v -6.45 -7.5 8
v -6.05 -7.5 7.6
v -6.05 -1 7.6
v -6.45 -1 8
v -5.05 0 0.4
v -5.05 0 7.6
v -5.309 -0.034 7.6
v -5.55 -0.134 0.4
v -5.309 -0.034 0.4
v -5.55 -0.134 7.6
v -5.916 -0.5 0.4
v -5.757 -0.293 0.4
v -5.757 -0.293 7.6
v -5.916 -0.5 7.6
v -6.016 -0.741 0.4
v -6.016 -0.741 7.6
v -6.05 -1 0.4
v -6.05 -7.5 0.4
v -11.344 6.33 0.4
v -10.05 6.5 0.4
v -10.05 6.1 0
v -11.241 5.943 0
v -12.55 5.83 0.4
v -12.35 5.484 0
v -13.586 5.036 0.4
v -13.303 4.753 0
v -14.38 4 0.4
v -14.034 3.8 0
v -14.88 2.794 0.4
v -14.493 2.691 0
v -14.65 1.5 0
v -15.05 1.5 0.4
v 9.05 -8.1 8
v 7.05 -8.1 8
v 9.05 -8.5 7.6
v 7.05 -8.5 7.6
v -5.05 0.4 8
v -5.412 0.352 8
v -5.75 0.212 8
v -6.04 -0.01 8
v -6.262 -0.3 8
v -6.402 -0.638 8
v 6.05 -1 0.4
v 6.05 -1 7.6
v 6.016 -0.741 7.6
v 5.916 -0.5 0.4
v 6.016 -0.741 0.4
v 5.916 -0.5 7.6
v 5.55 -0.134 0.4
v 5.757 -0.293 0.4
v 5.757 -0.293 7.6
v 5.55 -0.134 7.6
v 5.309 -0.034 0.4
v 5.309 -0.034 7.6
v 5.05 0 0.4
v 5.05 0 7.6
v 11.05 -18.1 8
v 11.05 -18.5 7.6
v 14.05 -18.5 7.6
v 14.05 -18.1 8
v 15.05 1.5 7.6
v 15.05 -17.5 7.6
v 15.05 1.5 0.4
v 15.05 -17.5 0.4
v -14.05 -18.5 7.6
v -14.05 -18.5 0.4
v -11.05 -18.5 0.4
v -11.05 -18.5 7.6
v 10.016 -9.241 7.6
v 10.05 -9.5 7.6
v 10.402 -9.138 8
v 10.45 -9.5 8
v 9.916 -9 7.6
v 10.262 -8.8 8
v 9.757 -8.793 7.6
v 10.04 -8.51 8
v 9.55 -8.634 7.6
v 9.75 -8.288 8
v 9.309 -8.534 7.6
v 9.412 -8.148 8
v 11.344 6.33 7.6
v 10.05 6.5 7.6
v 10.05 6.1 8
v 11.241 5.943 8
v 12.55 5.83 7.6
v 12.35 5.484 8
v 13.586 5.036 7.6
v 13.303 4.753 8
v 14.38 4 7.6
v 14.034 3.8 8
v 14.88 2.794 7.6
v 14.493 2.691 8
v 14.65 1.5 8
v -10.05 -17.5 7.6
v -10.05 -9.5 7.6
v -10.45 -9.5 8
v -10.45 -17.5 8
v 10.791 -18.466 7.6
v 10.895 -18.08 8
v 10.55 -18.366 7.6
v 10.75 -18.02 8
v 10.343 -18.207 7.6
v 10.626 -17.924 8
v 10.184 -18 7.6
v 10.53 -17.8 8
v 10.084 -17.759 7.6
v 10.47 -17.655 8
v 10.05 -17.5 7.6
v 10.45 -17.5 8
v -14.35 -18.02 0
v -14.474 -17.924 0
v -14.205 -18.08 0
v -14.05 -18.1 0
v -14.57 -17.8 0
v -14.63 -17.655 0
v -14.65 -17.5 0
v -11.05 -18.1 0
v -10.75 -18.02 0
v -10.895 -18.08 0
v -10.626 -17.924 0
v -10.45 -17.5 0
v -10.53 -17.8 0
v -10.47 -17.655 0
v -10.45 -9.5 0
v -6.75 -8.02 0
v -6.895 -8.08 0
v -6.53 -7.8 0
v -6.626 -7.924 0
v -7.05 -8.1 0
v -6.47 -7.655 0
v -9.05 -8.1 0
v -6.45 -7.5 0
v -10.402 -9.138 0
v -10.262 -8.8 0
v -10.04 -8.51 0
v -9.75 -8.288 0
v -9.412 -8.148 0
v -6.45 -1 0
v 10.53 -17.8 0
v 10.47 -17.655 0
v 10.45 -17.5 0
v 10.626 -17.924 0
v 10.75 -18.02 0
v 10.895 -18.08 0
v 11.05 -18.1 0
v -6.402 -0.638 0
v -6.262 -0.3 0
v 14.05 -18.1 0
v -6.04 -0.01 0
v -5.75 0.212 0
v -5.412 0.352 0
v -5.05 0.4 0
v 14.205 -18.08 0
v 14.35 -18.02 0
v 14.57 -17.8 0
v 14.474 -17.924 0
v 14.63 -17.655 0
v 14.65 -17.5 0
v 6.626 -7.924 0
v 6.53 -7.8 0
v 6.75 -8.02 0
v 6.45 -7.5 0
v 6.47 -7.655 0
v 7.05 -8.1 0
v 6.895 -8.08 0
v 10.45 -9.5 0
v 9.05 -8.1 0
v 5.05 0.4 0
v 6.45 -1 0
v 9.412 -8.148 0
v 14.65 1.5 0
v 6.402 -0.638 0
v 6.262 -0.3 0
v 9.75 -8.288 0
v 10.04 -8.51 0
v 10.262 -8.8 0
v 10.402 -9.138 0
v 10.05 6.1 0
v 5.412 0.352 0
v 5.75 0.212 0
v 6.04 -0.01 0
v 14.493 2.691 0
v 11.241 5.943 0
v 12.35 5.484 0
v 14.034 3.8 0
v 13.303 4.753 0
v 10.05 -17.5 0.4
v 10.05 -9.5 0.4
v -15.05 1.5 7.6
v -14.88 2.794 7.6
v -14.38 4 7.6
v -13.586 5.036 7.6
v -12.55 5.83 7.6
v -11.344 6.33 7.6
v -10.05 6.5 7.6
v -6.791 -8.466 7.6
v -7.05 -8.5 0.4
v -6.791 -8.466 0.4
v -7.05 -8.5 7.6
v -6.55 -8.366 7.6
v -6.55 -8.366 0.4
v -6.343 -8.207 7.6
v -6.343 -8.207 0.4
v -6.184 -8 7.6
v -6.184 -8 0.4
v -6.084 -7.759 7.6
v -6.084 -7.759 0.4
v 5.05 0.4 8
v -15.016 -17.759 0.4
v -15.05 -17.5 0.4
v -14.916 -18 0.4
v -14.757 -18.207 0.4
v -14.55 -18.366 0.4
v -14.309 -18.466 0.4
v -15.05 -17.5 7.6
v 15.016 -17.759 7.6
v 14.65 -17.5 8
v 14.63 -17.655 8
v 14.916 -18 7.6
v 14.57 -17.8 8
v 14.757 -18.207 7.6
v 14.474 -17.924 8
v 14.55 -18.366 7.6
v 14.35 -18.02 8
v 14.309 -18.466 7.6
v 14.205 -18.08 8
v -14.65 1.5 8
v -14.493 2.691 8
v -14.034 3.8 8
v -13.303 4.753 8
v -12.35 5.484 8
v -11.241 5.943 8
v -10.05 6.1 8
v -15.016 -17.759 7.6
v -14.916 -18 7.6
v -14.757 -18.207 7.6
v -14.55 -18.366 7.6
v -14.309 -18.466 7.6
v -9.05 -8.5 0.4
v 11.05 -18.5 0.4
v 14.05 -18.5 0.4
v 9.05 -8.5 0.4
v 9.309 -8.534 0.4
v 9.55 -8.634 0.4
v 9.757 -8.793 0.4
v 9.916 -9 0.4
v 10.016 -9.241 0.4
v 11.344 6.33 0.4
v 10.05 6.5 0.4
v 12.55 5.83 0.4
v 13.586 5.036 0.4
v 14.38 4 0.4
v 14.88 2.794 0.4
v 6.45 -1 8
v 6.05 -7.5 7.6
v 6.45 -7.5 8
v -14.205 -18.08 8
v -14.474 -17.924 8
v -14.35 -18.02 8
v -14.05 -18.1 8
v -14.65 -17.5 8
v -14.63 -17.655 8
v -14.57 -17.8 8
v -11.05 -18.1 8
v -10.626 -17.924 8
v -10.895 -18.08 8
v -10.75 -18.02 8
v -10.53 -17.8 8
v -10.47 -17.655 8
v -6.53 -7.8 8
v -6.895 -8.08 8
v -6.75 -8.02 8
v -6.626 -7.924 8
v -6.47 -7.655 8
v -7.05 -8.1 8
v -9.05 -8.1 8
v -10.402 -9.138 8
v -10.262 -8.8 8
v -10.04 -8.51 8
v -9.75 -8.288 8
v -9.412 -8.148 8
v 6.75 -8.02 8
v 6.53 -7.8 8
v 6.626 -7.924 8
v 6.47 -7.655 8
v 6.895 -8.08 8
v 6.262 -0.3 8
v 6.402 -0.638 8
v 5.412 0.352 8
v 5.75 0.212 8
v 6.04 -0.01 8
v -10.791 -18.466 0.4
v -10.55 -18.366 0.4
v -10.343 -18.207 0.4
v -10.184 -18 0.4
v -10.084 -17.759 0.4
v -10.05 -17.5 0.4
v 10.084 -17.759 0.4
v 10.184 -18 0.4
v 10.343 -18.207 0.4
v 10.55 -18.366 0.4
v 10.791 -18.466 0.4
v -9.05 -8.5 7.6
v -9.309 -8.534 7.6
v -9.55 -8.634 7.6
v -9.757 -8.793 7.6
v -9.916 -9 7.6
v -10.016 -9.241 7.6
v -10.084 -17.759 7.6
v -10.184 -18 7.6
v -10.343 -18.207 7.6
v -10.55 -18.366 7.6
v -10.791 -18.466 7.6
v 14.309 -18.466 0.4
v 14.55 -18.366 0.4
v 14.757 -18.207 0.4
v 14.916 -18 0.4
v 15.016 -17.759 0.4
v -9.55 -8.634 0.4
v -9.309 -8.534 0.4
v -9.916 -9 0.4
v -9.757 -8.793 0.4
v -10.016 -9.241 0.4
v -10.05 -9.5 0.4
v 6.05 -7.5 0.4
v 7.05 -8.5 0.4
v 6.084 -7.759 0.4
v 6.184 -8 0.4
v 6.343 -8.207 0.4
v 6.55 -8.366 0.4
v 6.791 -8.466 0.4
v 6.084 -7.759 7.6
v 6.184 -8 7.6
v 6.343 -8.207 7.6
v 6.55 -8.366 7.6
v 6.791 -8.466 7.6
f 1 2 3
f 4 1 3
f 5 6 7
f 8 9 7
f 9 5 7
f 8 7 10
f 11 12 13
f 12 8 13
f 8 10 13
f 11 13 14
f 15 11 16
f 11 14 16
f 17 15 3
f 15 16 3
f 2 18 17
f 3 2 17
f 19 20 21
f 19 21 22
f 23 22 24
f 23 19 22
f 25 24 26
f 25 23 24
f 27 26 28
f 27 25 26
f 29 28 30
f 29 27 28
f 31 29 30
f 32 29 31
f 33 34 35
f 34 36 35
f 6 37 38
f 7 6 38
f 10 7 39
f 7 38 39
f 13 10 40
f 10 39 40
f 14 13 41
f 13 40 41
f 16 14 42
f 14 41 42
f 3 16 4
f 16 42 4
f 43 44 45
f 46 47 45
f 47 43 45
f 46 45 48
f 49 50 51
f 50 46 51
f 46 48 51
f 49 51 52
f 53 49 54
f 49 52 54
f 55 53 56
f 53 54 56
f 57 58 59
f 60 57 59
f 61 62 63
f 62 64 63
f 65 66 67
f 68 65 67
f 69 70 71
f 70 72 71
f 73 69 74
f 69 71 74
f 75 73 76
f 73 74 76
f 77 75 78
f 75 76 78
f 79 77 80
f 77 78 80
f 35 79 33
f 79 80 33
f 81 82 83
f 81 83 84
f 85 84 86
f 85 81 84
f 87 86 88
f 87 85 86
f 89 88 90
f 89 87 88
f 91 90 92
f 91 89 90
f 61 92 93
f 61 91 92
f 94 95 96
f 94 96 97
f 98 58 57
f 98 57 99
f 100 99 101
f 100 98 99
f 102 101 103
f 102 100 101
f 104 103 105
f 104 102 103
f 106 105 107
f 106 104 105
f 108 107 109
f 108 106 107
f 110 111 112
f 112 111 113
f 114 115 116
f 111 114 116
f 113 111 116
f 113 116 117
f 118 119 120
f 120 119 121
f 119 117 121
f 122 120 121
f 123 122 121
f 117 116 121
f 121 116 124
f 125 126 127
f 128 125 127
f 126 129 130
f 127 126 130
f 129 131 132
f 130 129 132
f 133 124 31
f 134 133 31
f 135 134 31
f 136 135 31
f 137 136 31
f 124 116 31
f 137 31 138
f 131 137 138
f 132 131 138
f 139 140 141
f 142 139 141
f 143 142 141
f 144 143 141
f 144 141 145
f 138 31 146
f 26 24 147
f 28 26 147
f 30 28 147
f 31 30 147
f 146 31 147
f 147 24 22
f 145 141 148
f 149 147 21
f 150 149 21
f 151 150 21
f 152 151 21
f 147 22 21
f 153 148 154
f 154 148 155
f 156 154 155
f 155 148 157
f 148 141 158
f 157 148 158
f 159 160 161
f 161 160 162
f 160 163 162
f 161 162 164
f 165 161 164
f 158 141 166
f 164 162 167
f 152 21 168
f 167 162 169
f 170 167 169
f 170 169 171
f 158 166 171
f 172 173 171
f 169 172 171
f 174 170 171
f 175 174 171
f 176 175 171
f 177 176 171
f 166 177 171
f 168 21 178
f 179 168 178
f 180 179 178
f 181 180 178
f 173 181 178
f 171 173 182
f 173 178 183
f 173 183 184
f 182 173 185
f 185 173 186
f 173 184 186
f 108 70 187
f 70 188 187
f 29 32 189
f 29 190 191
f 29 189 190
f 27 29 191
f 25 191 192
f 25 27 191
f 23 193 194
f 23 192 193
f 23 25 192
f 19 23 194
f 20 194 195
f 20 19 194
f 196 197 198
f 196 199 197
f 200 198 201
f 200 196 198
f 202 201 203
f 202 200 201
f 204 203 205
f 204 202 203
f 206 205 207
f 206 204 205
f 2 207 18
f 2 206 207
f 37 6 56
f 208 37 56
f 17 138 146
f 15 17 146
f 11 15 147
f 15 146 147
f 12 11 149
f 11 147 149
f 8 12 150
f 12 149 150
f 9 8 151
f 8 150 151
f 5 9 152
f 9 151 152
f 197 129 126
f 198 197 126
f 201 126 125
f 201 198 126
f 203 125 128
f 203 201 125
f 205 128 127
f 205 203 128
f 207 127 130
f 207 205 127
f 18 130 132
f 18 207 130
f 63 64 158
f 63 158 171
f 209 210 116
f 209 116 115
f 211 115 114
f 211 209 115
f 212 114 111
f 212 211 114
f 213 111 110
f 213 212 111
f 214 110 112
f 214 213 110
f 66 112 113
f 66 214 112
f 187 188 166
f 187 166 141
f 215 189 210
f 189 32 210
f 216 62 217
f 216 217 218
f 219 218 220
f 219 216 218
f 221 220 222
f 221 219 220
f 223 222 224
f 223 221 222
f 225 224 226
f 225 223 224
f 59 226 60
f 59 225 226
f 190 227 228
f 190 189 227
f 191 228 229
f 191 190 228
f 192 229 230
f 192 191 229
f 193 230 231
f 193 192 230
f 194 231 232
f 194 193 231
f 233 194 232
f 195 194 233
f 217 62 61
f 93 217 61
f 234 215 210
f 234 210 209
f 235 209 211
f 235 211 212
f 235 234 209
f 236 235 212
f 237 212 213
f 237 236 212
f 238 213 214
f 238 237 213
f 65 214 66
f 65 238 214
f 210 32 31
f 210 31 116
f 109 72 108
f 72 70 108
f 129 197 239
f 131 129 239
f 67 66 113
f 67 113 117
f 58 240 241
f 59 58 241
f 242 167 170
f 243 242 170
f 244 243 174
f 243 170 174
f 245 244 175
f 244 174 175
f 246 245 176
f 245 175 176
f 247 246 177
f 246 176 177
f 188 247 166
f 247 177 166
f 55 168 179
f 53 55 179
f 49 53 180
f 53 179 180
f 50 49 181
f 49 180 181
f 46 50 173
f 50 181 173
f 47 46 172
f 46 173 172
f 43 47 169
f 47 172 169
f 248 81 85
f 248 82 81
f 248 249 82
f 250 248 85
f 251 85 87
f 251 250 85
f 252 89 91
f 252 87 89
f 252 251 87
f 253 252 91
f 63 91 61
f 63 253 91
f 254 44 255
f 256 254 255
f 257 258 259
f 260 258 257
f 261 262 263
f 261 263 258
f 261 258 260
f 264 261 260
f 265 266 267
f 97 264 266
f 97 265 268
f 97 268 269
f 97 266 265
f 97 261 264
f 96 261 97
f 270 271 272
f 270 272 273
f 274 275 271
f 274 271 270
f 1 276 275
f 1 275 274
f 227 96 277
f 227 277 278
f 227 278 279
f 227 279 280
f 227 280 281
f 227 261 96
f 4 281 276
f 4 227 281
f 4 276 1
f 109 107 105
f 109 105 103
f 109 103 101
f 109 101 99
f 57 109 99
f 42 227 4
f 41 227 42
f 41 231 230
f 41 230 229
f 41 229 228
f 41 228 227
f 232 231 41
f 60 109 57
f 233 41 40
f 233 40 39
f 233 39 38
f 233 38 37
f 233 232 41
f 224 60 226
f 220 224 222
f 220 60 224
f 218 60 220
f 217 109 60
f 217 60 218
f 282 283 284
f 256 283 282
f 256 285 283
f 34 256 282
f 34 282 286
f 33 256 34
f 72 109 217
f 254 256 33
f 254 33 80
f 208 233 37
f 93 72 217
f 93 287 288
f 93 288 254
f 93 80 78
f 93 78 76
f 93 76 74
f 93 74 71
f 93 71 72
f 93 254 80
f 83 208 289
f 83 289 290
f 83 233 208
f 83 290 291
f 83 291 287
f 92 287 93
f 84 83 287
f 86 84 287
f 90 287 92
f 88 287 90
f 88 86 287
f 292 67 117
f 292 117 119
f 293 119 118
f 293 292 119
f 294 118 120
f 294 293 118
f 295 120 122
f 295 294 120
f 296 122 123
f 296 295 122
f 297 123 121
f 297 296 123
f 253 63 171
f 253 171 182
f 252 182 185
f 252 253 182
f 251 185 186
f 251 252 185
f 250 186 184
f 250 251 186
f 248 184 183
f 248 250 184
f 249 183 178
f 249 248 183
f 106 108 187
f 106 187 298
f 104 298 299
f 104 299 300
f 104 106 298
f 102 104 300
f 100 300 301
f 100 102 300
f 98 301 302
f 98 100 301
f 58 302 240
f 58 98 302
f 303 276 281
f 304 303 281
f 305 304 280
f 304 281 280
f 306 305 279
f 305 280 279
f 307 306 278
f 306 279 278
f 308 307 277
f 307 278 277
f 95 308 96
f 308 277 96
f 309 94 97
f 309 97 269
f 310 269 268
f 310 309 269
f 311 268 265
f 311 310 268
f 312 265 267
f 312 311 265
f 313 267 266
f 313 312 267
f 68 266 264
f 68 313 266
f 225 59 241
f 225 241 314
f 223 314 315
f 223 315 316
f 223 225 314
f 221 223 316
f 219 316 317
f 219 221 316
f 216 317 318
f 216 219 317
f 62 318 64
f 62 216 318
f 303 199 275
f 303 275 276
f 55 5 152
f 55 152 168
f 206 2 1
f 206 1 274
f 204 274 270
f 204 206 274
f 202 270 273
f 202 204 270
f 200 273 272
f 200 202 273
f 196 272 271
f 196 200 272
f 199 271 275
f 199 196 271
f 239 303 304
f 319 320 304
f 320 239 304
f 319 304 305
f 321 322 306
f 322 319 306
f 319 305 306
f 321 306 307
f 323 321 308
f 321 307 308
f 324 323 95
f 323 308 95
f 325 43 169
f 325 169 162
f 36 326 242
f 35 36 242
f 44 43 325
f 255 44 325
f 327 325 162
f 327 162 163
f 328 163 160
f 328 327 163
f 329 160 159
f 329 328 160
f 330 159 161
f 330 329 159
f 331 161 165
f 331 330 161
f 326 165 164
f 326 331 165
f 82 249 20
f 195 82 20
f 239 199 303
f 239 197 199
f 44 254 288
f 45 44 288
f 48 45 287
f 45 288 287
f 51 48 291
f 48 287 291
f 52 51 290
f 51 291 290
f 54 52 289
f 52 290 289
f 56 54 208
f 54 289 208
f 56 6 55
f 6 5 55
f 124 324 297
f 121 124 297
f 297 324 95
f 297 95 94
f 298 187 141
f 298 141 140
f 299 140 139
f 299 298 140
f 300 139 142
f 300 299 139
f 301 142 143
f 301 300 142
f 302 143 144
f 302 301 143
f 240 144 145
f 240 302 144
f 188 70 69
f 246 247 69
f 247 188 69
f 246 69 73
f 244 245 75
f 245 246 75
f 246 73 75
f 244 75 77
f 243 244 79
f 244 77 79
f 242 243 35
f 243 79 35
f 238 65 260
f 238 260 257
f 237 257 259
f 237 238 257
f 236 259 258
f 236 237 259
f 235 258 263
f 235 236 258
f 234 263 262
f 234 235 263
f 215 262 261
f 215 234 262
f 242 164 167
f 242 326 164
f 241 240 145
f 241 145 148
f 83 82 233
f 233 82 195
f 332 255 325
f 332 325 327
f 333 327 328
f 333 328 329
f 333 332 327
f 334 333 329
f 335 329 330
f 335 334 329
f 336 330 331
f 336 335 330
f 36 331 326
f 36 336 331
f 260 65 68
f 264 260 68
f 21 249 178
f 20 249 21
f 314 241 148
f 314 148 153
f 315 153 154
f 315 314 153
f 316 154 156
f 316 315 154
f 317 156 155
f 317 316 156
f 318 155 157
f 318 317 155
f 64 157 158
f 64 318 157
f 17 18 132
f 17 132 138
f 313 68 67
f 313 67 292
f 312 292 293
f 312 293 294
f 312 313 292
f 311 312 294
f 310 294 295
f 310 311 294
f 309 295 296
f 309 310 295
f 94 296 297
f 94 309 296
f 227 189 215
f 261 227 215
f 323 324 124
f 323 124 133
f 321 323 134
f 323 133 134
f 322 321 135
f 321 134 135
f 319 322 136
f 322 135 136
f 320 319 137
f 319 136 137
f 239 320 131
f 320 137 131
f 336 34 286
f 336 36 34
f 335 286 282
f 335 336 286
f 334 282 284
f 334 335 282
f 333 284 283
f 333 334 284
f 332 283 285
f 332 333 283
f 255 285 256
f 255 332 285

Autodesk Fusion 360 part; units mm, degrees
sketch "Sketch1" plane through (0, 0, 0) normal (0, 0, 1) x (1, 0, 0)
  line L0 (-6.05, -8.5) -> (-6.05, 0)
  line L1 (-6.05, 0) -> (6.05, 0)
  line L2 (6.05, 0) -> (6.05, -8.5)
  line L3 (6.05, -8.5) -> (10.05, -8.5)
  line L4 (10.05, -8.5) -> (10.05, -18.5)
  line L5 (-6.05, -8.5) -> (-10.05, -8.5)
  line L6 (-10.05, -8.5) -> (-10.05, -18.5)
  line L7 (10.05, -18.5) -> (15.05, -18.5)
  line L8 (15.05, -18.5) -> (15.05, 6.5)
  line L9 (15.05, 6.5) -> (-15.05, 6.5)
  line L10 (-15.05, 6.5) -> (-15.05, -18.5)
  line L11 (-15.05, -18.5) -> (-10.05, -18.5)
  arc A0 (-10.05, 6.5) -> (-15.05, 1.5) centre (-10.05, 1.5) ccw
  arc A1 (15.05, 1.5) -> (10.05, 6.5) centre (10.05, 1.5) ccw
  line L12 (-10.05, -18.5) -> (10.05, -18.5) construction
  point P0 (0, -18.5)
  dimension "d1" = 12.1
  dimension "d2" = 8.5
  dimension "d3" = 20.1
  dimension "d4" = 10
  dimension "d5" = 5
  dimension "d6" = 25
  dimension "d7" = 5
  dimension "d8" = 5
extrude "Extrude1" add sketch "Sketch1" along normal blind 8 contours L0 L1 L2 L3 L4 L5 L6 L7 L8 L9 L10 L11 A0 A1
fillet "Fillet1" radius 1 10 edges at (6.05, 0, 4) (-6.05, 0, 4) (-6.05, -8.5, 4) (-10.05, -8.5, 4) (-10.05, -18.5, 4) (-15.05, -18.5, 4) (6.05, -8.5, 4) (10.05, -8.5, 4) (10.05, -18.5, 4) (15.05, -18.5, 4)
chamfer "Chamfer1" distance 0.4 angle 45 48 edges at (12.55, -18.5, 0) (14.7571, -18.2071, 0) (15.05, -8, 0) (13.5855, 5.0355, 0) (0, 6.5, 0) (-13.5855, 5.0355, 0) (-15.05, -8, 0) (-14.7571, -18.2071, 0) (-12.55, -18.5, 0) (-10.3429, -18.2071, 0) (-10.05, -13.5, 0) (-9.7571, -8.7929, 0) (-8.05, -8.5, 0) (-6.3429, -8.2071, 0) (-6.05, -4.25, 0) (-5.7571, -0.2929, 0) (0, 0, 0) (5.7571, -0.2929, 0) (6.05, -4.25, 0) (6.3429, -8.2071, 0) (8.05, -8.5, 0) (9.7571, -8.7929, 0) (10.05, -13.5, 0) (10.3429, -18.2071, 0) (12.55, -18.5, 8) (14.7571, -18.2071, 8) (15.05, -8, 8) (13.5855, 5.0355, 8) (0, 6.5, 8) (-13.5855, 5.0355, 8) (-15.05, -8, 8) (-14.7571, -18.2071, 8) (-12.55, -18.5, 8) (-10.3429, -18.2071, 8) (-10.05, -13.5, 8) (-9.7571, -8.7929, 8) (-8.05, -8.5, 8) (-6.3429, -8.2071, 8) (-6.05, -4.25, 8) (-5.7571, -0.2929, 8) (0, 0, 8) (5.7571, -0.2929, 8) (6.05, -4.25, 8) (6.3429, -8.2071, 8) (8.05, -8.5, 8) (9.7571, -8.7929, 8) (10.05, -13.5, 8) (10.3429, -18.2071, 8)
